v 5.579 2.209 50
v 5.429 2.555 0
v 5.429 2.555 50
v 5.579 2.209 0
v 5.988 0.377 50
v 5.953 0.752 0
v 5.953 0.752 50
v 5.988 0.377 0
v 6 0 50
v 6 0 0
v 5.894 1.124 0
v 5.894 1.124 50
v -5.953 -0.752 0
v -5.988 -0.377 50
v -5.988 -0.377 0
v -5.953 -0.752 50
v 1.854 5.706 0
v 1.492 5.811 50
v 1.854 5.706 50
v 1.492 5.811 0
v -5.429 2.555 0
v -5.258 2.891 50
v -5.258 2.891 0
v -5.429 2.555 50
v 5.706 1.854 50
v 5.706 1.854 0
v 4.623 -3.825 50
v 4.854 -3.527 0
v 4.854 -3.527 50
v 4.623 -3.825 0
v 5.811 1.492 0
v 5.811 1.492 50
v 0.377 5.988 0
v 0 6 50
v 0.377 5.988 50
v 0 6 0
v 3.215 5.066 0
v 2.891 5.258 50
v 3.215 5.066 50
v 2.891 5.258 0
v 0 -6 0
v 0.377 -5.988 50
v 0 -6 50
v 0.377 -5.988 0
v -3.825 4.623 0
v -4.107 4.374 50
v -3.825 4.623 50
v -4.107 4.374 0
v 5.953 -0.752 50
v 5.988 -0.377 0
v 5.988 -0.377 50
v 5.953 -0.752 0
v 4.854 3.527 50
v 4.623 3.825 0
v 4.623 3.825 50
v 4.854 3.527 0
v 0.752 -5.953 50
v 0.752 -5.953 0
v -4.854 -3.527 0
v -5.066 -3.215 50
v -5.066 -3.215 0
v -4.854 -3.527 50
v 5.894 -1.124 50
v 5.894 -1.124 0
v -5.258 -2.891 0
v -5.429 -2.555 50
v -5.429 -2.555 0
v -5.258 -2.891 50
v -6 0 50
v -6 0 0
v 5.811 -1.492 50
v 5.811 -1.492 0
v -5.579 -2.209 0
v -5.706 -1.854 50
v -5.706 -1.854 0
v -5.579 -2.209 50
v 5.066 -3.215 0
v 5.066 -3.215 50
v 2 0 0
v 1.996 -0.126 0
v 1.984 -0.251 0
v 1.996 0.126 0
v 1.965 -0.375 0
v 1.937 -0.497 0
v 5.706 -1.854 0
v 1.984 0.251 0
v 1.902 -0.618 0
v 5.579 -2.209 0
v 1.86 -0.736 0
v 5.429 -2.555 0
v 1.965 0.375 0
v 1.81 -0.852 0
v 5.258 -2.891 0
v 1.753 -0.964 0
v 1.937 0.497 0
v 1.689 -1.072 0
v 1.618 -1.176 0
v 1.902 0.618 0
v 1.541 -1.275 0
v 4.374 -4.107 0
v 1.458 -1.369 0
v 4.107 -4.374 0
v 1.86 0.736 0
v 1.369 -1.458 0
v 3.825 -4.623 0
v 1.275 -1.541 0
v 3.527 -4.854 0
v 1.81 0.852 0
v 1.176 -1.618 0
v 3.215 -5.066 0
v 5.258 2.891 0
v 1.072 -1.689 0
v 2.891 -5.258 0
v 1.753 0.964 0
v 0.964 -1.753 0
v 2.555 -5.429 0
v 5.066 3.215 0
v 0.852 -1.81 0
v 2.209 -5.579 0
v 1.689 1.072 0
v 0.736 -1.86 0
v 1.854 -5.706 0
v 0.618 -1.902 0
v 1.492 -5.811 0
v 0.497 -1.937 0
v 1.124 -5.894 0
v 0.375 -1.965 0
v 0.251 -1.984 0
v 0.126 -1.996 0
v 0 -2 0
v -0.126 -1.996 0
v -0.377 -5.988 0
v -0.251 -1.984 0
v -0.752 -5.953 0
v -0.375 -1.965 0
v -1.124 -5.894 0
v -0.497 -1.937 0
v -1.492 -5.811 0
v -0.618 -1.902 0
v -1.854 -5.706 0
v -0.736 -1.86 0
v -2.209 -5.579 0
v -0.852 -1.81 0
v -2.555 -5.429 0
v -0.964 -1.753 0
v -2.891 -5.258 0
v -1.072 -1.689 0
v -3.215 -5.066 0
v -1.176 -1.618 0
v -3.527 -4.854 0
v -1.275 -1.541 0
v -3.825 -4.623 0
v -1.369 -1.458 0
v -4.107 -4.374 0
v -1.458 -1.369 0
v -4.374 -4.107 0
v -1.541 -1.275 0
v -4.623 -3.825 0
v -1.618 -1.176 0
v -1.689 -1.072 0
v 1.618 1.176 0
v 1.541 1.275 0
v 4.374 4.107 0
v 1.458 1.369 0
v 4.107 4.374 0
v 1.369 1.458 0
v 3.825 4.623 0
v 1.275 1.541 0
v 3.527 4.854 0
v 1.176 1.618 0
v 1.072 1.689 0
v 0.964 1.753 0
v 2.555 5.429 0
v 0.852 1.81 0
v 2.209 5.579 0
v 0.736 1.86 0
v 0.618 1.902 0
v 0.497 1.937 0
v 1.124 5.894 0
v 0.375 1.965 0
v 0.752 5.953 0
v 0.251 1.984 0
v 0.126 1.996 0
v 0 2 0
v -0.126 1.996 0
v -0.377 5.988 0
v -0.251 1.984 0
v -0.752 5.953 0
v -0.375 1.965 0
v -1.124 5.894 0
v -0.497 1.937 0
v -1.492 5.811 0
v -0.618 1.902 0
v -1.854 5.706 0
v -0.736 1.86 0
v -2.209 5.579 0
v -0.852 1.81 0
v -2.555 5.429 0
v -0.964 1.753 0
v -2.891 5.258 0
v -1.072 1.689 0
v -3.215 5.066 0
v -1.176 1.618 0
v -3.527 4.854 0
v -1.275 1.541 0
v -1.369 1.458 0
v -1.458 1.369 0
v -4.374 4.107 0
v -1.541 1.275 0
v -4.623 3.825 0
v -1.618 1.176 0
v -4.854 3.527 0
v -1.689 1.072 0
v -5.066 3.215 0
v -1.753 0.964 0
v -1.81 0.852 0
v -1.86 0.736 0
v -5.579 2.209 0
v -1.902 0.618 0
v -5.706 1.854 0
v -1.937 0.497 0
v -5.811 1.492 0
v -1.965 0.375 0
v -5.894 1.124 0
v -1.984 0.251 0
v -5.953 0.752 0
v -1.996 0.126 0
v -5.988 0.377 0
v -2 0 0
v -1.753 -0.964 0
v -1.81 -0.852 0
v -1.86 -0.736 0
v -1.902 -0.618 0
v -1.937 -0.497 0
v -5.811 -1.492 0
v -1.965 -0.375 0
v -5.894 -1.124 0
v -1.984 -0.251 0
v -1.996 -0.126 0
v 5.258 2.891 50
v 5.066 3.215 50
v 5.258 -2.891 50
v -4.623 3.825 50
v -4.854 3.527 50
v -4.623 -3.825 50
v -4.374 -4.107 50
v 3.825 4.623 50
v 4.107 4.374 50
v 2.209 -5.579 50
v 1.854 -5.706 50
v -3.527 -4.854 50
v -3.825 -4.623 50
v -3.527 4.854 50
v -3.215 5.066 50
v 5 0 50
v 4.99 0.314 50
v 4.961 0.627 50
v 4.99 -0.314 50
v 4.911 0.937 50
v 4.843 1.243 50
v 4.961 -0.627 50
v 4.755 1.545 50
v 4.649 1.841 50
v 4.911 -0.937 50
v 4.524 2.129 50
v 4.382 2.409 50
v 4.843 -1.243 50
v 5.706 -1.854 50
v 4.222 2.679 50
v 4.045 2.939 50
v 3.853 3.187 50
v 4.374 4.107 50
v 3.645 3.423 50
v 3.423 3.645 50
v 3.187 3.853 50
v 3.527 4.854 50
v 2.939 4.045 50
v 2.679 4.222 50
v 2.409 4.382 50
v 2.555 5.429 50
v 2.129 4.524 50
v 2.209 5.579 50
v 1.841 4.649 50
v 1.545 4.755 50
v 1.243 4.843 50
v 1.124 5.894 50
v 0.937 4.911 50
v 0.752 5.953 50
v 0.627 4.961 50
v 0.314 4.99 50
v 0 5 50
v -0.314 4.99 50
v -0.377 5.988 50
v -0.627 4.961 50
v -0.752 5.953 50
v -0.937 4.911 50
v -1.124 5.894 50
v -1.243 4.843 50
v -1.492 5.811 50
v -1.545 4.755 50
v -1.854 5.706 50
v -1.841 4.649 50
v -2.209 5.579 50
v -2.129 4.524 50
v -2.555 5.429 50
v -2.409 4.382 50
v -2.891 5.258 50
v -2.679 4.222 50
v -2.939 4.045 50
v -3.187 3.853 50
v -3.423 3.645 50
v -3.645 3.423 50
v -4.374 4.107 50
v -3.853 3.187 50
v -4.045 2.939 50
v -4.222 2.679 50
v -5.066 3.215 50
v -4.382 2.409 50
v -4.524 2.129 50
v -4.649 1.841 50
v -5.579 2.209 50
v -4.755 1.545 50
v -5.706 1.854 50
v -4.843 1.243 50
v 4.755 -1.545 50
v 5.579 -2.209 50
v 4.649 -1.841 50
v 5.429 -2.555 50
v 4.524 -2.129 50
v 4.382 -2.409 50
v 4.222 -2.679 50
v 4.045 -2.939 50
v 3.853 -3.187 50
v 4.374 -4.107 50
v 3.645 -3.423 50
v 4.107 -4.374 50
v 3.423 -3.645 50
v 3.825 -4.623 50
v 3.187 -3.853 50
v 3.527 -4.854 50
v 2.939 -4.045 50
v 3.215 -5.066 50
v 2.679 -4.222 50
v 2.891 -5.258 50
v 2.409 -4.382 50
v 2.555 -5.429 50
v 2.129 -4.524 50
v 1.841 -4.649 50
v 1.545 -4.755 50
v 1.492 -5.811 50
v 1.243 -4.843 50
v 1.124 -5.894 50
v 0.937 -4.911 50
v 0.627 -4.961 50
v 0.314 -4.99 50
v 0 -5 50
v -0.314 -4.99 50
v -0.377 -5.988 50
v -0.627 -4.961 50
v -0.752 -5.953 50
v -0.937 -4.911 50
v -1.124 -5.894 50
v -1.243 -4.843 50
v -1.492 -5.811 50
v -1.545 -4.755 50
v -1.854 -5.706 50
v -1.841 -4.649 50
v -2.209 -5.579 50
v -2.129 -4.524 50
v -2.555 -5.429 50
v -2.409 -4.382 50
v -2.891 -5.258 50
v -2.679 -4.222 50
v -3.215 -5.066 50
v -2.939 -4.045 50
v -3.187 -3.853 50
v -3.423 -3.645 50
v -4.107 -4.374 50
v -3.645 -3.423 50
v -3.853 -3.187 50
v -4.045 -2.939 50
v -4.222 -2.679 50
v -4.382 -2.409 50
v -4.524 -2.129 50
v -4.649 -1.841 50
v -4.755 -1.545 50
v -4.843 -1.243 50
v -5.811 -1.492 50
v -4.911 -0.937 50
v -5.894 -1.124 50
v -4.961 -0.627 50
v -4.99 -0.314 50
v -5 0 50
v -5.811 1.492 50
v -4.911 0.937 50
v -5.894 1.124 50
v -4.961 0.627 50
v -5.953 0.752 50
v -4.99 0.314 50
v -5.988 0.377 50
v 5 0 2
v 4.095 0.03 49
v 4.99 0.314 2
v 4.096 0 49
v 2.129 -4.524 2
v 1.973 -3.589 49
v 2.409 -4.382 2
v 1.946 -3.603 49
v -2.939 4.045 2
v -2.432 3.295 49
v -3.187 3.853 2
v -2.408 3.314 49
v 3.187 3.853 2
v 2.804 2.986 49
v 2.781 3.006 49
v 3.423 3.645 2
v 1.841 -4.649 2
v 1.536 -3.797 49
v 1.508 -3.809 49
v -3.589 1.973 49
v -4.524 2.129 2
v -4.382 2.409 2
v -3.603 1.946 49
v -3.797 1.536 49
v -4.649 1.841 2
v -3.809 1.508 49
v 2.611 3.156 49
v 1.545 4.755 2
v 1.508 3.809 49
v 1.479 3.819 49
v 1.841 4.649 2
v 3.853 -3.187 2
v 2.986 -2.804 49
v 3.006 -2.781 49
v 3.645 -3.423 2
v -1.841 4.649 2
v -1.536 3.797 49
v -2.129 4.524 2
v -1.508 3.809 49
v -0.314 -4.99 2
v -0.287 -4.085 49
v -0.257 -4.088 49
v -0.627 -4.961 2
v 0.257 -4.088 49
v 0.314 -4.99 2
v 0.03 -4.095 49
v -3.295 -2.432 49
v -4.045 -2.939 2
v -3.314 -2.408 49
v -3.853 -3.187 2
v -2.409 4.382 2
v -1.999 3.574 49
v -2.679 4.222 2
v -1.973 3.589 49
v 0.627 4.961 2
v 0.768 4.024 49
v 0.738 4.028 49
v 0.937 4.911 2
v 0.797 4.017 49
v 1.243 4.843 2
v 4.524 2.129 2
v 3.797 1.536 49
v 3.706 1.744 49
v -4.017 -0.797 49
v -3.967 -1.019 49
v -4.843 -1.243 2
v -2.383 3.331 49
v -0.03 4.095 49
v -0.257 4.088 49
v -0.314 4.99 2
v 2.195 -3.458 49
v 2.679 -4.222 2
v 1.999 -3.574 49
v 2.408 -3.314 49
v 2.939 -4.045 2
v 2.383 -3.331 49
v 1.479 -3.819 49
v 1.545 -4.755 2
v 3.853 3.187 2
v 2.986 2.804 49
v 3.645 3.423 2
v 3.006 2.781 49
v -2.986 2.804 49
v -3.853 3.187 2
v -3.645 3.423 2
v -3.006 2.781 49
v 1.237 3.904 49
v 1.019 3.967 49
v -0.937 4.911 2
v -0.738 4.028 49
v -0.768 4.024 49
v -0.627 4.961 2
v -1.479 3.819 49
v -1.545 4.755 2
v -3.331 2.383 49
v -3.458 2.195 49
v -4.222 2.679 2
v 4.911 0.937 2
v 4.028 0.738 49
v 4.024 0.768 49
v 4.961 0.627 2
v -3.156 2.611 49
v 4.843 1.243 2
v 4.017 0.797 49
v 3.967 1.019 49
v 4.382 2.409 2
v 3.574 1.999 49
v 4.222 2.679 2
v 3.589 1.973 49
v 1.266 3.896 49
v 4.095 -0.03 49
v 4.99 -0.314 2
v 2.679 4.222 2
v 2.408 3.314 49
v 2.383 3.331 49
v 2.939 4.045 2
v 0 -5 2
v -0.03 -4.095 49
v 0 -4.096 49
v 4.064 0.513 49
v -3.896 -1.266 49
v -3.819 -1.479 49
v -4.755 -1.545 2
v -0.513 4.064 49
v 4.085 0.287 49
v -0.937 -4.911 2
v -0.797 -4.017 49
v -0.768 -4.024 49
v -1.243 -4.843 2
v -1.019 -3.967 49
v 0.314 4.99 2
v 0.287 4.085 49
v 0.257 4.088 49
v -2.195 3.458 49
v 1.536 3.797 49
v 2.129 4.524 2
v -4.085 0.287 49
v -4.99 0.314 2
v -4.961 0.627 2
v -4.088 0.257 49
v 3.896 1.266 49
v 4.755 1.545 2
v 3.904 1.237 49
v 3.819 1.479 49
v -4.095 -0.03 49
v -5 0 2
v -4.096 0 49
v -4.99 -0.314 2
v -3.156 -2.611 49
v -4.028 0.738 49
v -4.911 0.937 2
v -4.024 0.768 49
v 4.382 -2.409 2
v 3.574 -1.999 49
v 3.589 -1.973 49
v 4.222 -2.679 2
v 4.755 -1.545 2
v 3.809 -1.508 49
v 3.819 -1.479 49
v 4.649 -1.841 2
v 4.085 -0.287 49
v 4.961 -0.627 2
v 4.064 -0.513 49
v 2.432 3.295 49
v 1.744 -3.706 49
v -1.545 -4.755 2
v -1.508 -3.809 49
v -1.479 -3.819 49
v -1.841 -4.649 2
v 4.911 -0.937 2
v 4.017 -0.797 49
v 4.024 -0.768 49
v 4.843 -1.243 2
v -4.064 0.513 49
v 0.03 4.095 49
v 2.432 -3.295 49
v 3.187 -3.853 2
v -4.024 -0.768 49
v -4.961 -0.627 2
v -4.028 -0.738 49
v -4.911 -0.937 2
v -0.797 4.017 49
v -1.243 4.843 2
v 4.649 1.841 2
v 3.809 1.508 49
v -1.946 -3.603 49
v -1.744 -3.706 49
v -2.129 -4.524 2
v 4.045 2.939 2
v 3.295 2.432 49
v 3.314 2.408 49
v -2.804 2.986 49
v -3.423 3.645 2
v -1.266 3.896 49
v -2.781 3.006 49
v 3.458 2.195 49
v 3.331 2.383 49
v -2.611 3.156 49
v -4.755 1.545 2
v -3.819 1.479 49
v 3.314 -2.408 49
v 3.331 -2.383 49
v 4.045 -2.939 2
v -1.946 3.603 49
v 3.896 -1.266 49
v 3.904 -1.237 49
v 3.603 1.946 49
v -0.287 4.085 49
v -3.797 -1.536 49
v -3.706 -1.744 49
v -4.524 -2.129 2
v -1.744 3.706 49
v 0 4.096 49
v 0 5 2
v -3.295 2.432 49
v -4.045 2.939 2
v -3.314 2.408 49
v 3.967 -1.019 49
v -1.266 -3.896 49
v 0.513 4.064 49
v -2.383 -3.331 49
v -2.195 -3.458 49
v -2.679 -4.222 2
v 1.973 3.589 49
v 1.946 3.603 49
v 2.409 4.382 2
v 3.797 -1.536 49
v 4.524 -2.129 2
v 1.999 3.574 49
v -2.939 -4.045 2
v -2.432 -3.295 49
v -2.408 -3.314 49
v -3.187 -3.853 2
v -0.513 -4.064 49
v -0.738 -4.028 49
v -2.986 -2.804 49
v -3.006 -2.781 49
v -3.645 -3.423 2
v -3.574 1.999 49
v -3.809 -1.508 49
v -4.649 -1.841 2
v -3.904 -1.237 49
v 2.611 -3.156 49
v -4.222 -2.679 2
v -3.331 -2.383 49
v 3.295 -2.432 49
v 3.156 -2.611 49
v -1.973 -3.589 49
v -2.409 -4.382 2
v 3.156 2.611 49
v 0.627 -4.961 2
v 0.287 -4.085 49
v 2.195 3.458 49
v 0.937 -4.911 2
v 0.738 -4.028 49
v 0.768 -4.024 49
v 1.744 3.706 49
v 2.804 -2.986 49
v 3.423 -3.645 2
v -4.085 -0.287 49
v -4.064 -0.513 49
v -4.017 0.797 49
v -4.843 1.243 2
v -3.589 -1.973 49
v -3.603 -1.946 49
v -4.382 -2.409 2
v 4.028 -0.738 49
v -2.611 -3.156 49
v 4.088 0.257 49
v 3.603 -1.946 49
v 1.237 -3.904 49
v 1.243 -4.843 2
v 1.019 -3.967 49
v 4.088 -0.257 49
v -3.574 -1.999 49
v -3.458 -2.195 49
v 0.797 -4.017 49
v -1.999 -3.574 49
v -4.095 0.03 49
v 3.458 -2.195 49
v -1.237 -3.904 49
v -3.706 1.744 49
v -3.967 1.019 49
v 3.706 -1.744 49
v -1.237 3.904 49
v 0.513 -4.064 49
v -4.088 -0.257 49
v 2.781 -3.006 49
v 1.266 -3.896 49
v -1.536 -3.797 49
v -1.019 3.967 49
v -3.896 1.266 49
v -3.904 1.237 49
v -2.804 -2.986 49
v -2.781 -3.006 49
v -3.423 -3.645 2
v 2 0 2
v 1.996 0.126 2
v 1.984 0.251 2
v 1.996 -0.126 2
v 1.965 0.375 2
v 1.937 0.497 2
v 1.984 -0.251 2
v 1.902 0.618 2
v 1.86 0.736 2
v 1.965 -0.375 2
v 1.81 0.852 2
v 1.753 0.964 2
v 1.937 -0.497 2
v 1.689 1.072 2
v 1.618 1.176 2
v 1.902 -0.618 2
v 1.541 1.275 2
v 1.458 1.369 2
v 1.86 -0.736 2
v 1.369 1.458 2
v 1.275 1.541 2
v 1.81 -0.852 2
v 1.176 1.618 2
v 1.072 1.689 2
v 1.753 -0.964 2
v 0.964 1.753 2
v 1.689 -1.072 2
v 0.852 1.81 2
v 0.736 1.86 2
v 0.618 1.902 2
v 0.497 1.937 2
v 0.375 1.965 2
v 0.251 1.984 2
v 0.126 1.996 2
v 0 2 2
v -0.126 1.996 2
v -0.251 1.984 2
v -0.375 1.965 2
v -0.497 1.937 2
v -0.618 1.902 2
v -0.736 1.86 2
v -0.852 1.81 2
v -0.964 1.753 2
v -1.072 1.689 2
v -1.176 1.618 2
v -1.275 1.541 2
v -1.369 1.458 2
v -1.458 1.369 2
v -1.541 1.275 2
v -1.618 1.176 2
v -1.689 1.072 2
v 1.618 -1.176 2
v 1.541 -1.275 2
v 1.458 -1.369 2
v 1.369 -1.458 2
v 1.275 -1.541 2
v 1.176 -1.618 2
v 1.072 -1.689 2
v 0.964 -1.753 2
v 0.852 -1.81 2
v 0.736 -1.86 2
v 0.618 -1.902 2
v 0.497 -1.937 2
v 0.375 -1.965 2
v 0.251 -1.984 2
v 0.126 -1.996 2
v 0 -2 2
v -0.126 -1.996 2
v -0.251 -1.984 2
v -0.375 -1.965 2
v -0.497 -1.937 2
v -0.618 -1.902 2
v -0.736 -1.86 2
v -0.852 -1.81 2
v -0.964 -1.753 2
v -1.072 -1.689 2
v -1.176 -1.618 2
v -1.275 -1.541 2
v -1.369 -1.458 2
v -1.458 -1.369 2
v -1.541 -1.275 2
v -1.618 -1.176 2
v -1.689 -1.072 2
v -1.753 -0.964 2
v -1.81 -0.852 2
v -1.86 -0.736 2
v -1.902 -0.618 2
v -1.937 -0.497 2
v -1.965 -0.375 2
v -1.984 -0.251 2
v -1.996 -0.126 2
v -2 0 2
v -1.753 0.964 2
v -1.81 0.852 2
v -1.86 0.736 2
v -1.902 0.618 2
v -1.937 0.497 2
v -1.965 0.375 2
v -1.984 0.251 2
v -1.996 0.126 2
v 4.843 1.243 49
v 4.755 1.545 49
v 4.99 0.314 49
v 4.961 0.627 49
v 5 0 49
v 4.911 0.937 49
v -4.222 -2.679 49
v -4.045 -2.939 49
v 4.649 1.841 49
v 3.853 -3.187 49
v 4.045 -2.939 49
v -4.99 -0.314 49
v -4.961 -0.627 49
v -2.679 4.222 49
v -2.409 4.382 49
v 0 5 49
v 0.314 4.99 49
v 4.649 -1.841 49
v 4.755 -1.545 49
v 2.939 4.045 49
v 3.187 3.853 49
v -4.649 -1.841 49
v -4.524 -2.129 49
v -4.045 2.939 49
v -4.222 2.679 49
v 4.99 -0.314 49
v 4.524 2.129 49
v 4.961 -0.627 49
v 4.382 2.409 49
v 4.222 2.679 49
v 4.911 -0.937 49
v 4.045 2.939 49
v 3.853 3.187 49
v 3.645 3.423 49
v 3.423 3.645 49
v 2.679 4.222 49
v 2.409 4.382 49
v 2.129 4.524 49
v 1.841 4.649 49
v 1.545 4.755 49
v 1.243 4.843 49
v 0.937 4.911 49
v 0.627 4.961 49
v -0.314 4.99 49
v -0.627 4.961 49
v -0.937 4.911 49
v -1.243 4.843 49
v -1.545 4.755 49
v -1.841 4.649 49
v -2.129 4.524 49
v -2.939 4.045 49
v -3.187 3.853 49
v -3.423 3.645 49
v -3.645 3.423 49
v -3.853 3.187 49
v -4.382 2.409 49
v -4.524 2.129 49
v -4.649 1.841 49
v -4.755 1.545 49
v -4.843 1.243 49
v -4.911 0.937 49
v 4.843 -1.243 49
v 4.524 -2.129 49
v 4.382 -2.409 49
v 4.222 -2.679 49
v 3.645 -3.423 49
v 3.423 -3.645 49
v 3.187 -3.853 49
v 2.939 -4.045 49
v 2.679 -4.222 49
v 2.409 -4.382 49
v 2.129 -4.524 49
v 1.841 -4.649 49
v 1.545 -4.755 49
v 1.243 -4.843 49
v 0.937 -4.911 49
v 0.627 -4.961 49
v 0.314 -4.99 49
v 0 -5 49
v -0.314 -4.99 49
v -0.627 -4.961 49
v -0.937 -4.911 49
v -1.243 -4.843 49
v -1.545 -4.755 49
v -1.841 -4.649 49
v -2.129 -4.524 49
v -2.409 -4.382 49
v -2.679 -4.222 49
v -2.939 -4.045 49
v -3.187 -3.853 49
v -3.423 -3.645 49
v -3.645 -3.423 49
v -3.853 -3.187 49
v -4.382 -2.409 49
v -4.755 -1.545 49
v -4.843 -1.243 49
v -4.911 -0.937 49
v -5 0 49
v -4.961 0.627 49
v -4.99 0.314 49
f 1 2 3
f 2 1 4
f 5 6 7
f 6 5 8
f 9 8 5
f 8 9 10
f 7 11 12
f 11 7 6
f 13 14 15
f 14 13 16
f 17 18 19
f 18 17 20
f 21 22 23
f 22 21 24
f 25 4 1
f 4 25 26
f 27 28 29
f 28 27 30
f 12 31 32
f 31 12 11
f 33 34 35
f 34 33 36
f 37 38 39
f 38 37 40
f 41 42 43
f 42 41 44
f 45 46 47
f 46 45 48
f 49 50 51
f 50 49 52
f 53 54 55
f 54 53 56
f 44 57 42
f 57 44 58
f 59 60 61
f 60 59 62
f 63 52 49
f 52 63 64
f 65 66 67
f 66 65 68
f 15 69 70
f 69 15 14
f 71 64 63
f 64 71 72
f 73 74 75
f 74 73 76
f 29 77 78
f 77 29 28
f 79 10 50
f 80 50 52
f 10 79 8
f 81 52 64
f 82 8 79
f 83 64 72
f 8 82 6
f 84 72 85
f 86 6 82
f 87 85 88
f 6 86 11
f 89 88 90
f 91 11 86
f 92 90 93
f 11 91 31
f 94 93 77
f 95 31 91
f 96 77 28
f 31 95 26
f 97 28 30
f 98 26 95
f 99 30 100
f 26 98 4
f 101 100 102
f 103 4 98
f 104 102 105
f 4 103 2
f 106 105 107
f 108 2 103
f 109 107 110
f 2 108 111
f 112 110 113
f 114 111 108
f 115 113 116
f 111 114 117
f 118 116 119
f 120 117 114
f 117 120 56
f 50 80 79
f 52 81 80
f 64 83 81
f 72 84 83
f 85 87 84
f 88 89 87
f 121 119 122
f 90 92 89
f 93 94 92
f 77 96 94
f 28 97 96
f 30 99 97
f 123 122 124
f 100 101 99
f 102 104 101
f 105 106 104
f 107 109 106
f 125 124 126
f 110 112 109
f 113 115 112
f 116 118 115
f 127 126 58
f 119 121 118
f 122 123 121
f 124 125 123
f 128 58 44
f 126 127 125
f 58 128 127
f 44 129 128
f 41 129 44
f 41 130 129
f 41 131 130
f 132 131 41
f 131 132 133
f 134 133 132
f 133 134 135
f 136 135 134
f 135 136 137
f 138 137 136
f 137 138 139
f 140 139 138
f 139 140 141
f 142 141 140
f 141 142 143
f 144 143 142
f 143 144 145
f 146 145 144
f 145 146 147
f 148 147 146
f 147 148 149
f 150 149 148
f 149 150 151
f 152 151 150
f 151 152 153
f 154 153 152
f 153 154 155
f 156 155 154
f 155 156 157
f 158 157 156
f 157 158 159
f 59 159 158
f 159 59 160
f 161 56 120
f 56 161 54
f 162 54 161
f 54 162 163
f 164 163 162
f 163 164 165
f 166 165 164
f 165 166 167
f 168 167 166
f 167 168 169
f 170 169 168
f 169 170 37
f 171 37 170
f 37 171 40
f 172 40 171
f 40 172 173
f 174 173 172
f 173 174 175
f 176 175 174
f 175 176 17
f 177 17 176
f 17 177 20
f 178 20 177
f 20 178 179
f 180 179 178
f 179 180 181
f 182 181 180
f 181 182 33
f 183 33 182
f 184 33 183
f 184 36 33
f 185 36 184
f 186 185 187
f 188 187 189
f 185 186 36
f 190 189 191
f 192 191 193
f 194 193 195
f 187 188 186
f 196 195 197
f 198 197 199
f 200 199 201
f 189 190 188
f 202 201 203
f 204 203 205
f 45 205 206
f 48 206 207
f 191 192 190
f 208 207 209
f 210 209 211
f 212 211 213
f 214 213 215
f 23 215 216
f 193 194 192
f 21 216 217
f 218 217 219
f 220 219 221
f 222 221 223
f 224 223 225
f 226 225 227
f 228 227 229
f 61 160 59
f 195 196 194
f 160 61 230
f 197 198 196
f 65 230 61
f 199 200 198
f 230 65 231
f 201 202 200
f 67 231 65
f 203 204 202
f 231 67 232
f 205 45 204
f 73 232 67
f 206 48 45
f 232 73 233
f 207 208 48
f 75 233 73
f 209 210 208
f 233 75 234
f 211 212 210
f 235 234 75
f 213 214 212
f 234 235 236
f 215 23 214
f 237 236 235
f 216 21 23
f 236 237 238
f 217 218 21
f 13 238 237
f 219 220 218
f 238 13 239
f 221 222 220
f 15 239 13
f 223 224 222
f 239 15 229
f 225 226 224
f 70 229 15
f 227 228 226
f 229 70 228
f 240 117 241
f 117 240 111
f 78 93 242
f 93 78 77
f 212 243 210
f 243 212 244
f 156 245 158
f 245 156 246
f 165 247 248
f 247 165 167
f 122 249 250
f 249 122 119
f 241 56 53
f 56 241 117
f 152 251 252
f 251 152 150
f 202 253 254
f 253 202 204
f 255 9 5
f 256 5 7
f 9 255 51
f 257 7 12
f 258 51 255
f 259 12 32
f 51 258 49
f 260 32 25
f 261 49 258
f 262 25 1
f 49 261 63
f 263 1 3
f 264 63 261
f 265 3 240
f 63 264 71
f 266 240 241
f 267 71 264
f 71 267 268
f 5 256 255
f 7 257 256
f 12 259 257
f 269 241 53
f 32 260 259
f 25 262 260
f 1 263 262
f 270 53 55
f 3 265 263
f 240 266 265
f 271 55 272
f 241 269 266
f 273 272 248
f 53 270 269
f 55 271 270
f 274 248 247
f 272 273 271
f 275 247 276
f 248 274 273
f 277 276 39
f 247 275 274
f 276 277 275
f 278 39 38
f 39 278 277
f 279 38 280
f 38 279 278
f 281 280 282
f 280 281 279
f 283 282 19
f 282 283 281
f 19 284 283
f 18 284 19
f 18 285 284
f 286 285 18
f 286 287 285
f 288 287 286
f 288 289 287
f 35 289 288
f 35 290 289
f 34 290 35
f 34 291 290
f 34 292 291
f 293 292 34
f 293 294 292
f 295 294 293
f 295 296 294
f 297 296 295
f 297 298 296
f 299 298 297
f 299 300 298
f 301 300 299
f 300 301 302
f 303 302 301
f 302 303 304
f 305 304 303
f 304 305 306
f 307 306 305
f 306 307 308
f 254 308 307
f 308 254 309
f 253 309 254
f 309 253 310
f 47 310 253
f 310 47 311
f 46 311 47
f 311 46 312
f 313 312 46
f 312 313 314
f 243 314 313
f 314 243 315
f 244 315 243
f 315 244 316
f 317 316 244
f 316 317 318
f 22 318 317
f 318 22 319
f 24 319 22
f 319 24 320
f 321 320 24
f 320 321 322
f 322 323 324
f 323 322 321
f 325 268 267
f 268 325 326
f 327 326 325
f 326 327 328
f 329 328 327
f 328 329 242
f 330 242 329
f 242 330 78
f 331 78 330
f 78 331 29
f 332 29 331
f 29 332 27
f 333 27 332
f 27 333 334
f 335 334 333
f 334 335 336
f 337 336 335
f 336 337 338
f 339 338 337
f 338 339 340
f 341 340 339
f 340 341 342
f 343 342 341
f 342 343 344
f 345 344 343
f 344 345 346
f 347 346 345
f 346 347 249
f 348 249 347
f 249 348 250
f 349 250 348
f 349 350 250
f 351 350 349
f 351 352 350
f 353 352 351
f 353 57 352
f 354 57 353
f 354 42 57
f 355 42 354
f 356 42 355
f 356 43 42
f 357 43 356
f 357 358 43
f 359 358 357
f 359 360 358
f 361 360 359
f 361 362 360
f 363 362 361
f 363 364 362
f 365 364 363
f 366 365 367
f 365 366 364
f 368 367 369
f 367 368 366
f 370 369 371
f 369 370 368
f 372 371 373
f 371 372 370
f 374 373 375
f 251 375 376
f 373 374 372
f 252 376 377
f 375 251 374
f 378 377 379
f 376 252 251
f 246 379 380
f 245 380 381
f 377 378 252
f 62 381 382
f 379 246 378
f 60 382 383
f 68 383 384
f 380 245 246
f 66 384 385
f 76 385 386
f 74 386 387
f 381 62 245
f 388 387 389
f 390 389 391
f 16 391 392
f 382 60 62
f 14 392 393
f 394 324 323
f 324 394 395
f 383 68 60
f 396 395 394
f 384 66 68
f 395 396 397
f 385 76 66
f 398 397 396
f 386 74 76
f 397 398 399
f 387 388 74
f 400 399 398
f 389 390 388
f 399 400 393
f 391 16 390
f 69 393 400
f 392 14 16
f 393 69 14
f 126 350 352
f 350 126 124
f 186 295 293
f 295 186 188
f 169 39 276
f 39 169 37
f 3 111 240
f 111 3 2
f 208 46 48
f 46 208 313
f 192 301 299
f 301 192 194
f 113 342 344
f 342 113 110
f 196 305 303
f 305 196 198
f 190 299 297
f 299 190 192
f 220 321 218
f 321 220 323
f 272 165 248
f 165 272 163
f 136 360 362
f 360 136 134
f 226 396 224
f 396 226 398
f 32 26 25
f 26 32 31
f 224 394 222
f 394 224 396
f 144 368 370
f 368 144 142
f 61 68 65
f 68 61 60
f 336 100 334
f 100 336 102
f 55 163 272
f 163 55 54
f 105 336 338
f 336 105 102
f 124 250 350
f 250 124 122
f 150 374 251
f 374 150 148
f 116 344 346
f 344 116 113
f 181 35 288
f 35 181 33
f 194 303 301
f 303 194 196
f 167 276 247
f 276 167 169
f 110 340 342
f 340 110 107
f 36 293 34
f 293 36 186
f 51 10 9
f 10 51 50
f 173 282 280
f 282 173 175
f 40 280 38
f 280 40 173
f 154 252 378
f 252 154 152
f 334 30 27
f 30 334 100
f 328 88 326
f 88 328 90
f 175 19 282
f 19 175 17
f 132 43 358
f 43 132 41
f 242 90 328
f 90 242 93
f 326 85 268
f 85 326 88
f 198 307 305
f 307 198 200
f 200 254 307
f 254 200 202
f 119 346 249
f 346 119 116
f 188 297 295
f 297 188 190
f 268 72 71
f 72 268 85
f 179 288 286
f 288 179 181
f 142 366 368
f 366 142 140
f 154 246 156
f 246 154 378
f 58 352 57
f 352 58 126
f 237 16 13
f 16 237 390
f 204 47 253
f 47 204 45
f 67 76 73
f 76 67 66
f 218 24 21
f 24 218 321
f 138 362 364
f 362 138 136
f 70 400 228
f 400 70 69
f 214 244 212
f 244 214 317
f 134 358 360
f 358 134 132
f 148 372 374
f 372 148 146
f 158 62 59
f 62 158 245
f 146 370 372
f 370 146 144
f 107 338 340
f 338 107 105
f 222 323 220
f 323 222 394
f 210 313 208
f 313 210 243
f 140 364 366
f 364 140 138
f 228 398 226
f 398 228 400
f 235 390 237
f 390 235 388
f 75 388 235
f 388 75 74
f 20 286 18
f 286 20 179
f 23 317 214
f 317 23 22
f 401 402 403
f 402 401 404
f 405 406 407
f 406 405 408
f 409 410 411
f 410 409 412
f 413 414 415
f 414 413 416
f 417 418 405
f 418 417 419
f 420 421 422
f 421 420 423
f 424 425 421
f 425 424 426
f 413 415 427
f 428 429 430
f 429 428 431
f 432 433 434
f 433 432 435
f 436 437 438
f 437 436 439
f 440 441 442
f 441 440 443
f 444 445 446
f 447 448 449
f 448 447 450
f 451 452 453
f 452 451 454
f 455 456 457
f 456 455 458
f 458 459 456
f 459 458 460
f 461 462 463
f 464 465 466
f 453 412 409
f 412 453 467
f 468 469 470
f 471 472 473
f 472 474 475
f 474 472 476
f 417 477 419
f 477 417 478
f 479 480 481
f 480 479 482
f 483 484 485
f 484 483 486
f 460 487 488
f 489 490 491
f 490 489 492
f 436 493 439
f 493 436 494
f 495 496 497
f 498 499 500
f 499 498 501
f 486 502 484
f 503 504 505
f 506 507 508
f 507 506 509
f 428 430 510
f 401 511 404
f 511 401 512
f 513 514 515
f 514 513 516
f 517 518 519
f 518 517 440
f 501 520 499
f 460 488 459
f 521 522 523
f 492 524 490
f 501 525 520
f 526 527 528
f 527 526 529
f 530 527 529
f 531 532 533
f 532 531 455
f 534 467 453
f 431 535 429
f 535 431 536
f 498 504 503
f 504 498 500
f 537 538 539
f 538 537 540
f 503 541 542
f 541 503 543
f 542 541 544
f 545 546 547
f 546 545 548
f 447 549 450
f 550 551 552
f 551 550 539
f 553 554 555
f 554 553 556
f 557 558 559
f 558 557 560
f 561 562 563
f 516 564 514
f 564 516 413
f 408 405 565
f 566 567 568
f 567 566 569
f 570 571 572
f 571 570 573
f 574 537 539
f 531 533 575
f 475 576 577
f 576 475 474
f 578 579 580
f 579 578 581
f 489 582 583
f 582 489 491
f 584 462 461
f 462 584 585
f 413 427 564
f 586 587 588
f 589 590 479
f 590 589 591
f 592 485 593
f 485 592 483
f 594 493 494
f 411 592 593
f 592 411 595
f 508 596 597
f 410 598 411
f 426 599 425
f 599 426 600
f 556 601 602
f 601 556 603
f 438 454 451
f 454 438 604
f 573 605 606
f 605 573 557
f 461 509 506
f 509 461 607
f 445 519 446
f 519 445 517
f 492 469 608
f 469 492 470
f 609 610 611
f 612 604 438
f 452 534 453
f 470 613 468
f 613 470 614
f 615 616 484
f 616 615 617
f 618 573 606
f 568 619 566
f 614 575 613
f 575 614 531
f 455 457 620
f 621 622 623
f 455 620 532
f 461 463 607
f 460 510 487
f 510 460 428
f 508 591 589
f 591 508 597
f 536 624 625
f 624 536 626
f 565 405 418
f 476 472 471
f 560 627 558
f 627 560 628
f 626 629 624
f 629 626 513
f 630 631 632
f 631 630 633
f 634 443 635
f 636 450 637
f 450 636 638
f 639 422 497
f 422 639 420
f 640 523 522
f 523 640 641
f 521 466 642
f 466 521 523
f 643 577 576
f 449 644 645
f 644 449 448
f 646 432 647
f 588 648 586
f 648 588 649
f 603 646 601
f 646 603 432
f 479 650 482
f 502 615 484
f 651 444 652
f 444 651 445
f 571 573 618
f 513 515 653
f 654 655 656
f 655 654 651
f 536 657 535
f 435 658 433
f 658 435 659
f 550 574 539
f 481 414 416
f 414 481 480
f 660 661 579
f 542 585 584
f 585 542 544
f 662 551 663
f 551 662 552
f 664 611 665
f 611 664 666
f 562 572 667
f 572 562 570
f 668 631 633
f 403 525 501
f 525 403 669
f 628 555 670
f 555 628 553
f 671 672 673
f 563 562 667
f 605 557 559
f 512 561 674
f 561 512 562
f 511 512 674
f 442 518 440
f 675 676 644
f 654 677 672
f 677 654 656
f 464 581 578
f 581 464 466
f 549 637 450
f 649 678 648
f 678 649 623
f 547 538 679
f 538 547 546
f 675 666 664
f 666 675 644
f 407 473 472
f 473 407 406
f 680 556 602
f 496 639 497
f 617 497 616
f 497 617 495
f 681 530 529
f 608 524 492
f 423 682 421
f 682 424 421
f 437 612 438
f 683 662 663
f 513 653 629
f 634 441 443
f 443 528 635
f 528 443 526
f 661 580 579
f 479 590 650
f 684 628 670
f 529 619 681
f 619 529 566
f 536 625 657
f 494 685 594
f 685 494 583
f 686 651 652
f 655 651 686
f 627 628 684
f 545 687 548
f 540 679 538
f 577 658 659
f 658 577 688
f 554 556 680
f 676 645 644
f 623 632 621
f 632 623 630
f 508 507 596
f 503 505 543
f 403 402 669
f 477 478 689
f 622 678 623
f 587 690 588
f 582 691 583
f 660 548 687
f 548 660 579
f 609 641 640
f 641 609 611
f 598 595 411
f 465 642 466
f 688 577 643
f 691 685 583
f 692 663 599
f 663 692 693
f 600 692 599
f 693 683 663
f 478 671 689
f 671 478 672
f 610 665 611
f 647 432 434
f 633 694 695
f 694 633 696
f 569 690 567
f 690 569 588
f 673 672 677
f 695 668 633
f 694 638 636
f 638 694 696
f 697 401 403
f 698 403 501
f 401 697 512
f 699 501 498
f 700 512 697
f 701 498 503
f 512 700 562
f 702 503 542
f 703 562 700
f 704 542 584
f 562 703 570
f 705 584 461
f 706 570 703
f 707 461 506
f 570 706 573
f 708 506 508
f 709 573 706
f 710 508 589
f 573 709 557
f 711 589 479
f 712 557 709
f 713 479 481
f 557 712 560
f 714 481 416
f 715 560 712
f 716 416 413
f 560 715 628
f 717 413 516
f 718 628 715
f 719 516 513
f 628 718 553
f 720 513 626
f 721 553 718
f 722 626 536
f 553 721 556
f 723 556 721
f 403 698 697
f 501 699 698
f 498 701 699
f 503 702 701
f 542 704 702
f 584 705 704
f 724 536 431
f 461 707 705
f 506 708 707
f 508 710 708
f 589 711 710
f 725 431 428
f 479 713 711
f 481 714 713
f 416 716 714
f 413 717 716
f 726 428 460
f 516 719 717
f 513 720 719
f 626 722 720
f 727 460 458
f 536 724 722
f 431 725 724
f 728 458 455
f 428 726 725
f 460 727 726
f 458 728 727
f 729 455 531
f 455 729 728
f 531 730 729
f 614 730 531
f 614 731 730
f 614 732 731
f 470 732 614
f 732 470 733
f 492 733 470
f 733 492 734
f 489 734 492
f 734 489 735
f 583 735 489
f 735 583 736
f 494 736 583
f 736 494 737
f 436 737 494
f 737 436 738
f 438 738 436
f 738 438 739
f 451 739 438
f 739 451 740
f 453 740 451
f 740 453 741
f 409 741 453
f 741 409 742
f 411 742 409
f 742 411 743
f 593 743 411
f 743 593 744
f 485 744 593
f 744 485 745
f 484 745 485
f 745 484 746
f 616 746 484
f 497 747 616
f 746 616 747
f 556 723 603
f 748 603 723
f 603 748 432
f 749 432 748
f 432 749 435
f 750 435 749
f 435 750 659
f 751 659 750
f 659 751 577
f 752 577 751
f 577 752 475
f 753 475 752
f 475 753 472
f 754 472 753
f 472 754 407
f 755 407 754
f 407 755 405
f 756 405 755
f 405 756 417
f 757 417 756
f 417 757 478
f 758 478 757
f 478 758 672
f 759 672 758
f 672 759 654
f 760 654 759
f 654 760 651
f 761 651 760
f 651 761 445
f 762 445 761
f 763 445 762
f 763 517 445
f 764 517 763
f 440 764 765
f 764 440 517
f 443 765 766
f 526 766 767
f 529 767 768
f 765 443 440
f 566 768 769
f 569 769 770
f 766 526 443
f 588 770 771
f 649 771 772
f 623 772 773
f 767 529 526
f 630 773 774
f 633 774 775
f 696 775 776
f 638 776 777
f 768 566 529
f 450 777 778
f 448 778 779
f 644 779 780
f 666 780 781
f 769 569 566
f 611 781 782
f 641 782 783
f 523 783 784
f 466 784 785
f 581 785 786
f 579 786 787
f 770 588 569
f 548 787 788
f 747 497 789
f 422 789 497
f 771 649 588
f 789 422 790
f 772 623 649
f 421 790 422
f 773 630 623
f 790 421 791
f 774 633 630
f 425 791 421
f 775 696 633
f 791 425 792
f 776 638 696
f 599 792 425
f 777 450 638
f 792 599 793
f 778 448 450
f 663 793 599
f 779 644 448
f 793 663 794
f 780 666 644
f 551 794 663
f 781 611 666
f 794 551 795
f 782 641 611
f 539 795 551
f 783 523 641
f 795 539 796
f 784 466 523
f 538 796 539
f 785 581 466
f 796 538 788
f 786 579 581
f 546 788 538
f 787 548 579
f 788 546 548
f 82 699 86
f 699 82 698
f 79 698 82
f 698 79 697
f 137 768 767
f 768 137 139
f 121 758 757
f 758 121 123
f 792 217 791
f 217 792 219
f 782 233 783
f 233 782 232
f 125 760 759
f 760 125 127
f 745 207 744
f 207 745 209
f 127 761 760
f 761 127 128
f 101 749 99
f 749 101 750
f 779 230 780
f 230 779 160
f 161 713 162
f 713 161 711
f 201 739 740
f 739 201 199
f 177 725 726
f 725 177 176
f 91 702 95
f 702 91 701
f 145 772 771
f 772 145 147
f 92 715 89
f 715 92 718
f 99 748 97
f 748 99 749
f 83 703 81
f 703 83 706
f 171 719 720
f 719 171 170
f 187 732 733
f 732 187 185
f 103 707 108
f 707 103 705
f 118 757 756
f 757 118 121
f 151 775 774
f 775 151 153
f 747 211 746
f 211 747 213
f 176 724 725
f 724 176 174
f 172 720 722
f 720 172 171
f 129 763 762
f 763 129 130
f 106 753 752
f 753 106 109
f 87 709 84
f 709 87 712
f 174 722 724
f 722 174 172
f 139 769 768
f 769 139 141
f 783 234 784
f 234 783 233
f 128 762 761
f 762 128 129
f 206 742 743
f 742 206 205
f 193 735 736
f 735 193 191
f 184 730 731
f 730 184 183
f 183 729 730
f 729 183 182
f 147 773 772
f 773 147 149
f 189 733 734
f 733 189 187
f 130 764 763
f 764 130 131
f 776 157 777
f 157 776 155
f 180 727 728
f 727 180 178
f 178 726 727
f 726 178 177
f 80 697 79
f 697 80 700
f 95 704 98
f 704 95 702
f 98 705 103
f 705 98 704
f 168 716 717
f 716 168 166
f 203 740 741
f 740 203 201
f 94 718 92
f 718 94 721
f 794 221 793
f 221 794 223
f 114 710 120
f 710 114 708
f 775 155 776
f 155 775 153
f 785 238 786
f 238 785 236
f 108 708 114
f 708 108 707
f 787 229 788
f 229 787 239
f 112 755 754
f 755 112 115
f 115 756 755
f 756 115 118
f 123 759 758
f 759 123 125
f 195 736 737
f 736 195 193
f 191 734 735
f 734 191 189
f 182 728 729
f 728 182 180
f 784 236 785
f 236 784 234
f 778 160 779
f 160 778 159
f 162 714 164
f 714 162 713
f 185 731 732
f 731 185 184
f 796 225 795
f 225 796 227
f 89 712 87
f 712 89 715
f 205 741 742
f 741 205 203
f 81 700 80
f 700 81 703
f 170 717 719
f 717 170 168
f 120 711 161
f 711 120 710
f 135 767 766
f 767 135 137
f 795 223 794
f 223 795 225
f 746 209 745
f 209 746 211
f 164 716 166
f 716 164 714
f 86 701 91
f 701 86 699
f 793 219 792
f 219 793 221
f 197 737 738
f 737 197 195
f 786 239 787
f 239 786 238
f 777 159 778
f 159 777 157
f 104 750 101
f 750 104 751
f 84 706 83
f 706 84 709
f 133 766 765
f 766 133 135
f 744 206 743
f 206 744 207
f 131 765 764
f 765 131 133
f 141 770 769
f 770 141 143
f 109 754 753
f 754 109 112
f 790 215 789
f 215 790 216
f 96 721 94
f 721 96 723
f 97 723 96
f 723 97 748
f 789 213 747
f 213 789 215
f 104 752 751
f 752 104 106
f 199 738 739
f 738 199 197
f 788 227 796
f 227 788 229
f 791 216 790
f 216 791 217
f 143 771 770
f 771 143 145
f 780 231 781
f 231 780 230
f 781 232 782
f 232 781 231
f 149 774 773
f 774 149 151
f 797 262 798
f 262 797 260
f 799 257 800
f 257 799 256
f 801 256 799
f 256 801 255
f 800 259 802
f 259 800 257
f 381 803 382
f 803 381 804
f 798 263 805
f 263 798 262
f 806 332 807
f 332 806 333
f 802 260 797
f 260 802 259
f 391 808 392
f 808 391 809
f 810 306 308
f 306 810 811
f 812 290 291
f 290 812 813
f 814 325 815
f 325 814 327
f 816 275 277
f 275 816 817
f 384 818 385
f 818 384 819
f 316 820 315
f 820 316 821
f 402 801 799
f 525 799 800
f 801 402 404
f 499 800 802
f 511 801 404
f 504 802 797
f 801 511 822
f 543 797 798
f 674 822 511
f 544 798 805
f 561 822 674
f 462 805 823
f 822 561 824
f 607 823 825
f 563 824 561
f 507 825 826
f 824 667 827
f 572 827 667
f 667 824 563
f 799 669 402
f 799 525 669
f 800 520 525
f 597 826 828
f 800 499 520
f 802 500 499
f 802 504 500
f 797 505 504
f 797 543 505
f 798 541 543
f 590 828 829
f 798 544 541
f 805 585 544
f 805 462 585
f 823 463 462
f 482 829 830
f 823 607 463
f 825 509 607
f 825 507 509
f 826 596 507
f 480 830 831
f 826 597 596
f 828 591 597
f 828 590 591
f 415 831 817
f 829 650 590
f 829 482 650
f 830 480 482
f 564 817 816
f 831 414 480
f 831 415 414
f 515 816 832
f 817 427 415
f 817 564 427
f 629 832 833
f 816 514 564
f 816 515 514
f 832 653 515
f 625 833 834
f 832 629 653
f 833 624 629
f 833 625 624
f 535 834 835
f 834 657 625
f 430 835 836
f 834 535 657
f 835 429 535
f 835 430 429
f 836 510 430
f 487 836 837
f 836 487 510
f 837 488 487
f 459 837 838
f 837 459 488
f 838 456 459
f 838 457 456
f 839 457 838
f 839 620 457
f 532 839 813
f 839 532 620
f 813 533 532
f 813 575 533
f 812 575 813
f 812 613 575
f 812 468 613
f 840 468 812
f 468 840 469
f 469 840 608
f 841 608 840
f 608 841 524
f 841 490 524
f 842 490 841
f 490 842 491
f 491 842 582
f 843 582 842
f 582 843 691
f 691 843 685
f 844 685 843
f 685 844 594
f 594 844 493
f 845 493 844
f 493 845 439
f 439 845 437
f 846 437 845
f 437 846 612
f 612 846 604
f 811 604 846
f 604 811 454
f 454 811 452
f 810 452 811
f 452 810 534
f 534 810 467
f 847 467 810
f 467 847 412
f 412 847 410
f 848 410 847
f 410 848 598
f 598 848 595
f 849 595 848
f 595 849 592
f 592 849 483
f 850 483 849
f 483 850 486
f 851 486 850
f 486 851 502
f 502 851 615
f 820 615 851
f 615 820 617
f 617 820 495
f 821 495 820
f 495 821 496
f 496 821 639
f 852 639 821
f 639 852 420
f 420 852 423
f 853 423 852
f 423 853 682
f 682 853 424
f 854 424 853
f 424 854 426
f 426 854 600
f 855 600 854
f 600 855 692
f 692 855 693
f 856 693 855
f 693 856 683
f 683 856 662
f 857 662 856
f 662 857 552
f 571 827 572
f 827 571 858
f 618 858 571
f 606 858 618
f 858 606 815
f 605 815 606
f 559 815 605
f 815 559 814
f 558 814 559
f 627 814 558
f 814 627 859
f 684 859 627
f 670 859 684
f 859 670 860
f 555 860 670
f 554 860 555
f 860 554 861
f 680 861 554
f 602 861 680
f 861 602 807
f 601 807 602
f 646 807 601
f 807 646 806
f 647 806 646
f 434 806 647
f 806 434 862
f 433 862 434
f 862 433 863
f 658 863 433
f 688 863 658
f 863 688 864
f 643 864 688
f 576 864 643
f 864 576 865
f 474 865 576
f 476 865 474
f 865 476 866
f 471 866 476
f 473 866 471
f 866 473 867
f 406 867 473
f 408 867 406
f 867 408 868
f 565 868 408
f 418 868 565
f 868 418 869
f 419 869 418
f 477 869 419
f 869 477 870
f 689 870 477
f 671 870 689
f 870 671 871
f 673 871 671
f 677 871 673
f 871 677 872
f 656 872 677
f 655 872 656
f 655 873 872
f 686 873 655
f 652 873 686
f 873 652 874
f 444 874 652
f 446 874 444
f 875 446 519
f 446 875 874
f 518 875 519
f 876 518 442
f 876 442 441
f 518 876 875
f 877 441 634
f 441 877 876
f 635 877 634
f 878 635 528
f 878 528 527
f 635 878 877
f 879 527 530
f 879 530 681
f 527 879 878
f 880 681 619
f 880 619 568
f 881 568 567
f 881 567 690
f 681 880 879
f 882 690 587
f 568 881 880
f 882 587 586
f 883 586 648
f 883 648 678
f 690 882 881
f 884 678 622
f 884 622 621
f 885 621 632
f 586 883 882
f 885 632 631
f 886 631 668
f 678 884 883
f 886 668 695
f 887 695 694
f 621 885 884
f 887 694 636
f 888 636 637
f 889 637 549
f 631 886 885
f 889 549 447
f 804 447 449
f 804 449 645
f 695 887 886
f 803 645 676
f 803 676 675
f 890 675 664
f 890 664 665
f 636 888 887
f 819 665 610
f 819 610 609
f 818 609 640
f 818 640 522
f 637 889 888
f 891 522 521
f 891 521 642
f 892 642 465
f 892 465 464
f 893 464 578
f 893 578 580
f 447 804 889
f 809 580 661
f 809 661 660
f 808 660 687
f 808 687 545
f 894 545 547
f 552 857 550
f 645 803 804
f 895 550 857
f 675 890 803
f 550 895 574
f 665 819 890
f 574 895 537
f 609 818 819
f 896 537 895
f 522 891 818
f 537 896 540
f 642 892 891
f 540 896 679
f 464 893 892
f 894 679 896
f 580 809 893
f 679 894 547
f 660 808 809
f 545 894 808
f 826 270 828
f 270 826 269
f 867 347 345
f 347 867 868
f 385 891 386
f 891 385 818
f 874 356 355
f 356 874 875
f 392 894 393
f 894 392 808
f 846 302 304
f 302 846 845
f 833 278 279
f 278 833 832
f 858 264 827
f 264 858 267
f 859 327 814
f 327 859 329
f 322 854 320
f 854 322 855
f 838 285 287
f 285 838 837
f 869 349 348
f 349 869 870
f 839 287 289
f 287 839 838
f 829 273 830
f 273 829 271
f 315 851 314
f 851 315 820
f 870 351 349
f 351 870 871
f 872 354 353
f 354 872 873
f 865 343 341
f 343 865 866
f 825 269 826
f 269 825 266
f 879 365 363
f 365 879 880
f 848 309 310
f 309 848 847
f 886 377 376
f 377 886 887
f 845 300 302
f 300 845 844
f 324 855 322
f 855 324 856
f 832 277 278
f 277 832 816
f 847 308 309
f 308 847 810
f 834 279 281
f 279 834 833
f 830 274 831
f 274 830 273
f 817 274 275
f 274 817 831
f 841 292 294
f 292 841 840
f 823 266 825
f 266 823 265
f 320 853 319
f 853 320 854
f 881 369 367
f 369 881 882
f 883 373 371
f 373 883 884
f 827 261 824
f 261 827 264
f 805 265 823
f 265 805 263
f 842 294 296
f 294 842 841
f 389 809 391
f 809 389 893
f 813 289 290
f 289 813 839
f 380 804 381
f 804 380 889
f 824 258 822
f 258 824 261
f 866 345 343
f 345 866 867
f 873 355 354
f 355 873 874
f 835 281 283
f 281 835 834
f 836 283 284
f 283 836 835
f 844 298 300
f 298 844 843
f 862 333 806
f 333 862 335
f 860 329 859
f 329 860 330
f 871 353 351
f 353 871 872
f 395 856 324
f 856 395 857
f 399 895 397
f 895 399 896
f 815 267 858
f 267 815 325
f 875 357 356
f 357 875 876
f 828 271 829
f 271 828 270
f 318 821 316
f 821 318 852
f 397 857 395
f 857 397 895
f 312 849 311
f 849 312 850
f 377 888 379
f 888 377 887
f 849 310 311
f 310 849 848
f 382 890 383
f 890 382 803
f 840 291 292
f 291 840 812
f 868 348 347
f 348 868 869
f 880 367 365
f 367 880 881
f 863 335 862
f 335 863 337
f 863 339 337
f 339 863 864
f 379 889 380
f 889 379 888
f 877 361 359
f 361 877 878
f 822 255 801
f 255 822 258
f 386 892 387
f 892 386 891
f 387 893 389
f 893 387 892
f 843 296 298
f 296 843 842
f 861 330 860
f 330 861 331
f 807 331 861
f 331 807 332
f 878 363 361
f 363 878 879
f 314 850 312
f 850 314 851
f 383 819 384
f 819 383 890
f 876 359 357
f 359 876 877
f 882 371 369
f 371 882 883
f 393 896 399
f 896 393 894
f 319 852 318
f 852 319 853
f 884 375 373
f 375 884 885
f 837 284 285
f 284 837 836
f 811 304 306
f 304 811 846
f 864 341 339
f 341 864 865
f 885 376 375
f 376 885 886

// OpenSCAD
//MKII leg for 120mm fan
$fn=100;
//You can adjust the two variables below
depth=50;       //height of leg
hole=4;             //screw holes
difference(){
union(){
//Main outer cylinder
cylinder(h=depth, d1=12, d2=12);
}
//internal cylinder
translate([0,0,2])  
cylinder(h=depth+2,d1=10,d2=8);
translate([0,0,-1])  
cylinder(h=4,d1=hole,d2=hole);
translate([0,0,depth-1])  
cylinder(h=2,d1=10,d2=10);
}
